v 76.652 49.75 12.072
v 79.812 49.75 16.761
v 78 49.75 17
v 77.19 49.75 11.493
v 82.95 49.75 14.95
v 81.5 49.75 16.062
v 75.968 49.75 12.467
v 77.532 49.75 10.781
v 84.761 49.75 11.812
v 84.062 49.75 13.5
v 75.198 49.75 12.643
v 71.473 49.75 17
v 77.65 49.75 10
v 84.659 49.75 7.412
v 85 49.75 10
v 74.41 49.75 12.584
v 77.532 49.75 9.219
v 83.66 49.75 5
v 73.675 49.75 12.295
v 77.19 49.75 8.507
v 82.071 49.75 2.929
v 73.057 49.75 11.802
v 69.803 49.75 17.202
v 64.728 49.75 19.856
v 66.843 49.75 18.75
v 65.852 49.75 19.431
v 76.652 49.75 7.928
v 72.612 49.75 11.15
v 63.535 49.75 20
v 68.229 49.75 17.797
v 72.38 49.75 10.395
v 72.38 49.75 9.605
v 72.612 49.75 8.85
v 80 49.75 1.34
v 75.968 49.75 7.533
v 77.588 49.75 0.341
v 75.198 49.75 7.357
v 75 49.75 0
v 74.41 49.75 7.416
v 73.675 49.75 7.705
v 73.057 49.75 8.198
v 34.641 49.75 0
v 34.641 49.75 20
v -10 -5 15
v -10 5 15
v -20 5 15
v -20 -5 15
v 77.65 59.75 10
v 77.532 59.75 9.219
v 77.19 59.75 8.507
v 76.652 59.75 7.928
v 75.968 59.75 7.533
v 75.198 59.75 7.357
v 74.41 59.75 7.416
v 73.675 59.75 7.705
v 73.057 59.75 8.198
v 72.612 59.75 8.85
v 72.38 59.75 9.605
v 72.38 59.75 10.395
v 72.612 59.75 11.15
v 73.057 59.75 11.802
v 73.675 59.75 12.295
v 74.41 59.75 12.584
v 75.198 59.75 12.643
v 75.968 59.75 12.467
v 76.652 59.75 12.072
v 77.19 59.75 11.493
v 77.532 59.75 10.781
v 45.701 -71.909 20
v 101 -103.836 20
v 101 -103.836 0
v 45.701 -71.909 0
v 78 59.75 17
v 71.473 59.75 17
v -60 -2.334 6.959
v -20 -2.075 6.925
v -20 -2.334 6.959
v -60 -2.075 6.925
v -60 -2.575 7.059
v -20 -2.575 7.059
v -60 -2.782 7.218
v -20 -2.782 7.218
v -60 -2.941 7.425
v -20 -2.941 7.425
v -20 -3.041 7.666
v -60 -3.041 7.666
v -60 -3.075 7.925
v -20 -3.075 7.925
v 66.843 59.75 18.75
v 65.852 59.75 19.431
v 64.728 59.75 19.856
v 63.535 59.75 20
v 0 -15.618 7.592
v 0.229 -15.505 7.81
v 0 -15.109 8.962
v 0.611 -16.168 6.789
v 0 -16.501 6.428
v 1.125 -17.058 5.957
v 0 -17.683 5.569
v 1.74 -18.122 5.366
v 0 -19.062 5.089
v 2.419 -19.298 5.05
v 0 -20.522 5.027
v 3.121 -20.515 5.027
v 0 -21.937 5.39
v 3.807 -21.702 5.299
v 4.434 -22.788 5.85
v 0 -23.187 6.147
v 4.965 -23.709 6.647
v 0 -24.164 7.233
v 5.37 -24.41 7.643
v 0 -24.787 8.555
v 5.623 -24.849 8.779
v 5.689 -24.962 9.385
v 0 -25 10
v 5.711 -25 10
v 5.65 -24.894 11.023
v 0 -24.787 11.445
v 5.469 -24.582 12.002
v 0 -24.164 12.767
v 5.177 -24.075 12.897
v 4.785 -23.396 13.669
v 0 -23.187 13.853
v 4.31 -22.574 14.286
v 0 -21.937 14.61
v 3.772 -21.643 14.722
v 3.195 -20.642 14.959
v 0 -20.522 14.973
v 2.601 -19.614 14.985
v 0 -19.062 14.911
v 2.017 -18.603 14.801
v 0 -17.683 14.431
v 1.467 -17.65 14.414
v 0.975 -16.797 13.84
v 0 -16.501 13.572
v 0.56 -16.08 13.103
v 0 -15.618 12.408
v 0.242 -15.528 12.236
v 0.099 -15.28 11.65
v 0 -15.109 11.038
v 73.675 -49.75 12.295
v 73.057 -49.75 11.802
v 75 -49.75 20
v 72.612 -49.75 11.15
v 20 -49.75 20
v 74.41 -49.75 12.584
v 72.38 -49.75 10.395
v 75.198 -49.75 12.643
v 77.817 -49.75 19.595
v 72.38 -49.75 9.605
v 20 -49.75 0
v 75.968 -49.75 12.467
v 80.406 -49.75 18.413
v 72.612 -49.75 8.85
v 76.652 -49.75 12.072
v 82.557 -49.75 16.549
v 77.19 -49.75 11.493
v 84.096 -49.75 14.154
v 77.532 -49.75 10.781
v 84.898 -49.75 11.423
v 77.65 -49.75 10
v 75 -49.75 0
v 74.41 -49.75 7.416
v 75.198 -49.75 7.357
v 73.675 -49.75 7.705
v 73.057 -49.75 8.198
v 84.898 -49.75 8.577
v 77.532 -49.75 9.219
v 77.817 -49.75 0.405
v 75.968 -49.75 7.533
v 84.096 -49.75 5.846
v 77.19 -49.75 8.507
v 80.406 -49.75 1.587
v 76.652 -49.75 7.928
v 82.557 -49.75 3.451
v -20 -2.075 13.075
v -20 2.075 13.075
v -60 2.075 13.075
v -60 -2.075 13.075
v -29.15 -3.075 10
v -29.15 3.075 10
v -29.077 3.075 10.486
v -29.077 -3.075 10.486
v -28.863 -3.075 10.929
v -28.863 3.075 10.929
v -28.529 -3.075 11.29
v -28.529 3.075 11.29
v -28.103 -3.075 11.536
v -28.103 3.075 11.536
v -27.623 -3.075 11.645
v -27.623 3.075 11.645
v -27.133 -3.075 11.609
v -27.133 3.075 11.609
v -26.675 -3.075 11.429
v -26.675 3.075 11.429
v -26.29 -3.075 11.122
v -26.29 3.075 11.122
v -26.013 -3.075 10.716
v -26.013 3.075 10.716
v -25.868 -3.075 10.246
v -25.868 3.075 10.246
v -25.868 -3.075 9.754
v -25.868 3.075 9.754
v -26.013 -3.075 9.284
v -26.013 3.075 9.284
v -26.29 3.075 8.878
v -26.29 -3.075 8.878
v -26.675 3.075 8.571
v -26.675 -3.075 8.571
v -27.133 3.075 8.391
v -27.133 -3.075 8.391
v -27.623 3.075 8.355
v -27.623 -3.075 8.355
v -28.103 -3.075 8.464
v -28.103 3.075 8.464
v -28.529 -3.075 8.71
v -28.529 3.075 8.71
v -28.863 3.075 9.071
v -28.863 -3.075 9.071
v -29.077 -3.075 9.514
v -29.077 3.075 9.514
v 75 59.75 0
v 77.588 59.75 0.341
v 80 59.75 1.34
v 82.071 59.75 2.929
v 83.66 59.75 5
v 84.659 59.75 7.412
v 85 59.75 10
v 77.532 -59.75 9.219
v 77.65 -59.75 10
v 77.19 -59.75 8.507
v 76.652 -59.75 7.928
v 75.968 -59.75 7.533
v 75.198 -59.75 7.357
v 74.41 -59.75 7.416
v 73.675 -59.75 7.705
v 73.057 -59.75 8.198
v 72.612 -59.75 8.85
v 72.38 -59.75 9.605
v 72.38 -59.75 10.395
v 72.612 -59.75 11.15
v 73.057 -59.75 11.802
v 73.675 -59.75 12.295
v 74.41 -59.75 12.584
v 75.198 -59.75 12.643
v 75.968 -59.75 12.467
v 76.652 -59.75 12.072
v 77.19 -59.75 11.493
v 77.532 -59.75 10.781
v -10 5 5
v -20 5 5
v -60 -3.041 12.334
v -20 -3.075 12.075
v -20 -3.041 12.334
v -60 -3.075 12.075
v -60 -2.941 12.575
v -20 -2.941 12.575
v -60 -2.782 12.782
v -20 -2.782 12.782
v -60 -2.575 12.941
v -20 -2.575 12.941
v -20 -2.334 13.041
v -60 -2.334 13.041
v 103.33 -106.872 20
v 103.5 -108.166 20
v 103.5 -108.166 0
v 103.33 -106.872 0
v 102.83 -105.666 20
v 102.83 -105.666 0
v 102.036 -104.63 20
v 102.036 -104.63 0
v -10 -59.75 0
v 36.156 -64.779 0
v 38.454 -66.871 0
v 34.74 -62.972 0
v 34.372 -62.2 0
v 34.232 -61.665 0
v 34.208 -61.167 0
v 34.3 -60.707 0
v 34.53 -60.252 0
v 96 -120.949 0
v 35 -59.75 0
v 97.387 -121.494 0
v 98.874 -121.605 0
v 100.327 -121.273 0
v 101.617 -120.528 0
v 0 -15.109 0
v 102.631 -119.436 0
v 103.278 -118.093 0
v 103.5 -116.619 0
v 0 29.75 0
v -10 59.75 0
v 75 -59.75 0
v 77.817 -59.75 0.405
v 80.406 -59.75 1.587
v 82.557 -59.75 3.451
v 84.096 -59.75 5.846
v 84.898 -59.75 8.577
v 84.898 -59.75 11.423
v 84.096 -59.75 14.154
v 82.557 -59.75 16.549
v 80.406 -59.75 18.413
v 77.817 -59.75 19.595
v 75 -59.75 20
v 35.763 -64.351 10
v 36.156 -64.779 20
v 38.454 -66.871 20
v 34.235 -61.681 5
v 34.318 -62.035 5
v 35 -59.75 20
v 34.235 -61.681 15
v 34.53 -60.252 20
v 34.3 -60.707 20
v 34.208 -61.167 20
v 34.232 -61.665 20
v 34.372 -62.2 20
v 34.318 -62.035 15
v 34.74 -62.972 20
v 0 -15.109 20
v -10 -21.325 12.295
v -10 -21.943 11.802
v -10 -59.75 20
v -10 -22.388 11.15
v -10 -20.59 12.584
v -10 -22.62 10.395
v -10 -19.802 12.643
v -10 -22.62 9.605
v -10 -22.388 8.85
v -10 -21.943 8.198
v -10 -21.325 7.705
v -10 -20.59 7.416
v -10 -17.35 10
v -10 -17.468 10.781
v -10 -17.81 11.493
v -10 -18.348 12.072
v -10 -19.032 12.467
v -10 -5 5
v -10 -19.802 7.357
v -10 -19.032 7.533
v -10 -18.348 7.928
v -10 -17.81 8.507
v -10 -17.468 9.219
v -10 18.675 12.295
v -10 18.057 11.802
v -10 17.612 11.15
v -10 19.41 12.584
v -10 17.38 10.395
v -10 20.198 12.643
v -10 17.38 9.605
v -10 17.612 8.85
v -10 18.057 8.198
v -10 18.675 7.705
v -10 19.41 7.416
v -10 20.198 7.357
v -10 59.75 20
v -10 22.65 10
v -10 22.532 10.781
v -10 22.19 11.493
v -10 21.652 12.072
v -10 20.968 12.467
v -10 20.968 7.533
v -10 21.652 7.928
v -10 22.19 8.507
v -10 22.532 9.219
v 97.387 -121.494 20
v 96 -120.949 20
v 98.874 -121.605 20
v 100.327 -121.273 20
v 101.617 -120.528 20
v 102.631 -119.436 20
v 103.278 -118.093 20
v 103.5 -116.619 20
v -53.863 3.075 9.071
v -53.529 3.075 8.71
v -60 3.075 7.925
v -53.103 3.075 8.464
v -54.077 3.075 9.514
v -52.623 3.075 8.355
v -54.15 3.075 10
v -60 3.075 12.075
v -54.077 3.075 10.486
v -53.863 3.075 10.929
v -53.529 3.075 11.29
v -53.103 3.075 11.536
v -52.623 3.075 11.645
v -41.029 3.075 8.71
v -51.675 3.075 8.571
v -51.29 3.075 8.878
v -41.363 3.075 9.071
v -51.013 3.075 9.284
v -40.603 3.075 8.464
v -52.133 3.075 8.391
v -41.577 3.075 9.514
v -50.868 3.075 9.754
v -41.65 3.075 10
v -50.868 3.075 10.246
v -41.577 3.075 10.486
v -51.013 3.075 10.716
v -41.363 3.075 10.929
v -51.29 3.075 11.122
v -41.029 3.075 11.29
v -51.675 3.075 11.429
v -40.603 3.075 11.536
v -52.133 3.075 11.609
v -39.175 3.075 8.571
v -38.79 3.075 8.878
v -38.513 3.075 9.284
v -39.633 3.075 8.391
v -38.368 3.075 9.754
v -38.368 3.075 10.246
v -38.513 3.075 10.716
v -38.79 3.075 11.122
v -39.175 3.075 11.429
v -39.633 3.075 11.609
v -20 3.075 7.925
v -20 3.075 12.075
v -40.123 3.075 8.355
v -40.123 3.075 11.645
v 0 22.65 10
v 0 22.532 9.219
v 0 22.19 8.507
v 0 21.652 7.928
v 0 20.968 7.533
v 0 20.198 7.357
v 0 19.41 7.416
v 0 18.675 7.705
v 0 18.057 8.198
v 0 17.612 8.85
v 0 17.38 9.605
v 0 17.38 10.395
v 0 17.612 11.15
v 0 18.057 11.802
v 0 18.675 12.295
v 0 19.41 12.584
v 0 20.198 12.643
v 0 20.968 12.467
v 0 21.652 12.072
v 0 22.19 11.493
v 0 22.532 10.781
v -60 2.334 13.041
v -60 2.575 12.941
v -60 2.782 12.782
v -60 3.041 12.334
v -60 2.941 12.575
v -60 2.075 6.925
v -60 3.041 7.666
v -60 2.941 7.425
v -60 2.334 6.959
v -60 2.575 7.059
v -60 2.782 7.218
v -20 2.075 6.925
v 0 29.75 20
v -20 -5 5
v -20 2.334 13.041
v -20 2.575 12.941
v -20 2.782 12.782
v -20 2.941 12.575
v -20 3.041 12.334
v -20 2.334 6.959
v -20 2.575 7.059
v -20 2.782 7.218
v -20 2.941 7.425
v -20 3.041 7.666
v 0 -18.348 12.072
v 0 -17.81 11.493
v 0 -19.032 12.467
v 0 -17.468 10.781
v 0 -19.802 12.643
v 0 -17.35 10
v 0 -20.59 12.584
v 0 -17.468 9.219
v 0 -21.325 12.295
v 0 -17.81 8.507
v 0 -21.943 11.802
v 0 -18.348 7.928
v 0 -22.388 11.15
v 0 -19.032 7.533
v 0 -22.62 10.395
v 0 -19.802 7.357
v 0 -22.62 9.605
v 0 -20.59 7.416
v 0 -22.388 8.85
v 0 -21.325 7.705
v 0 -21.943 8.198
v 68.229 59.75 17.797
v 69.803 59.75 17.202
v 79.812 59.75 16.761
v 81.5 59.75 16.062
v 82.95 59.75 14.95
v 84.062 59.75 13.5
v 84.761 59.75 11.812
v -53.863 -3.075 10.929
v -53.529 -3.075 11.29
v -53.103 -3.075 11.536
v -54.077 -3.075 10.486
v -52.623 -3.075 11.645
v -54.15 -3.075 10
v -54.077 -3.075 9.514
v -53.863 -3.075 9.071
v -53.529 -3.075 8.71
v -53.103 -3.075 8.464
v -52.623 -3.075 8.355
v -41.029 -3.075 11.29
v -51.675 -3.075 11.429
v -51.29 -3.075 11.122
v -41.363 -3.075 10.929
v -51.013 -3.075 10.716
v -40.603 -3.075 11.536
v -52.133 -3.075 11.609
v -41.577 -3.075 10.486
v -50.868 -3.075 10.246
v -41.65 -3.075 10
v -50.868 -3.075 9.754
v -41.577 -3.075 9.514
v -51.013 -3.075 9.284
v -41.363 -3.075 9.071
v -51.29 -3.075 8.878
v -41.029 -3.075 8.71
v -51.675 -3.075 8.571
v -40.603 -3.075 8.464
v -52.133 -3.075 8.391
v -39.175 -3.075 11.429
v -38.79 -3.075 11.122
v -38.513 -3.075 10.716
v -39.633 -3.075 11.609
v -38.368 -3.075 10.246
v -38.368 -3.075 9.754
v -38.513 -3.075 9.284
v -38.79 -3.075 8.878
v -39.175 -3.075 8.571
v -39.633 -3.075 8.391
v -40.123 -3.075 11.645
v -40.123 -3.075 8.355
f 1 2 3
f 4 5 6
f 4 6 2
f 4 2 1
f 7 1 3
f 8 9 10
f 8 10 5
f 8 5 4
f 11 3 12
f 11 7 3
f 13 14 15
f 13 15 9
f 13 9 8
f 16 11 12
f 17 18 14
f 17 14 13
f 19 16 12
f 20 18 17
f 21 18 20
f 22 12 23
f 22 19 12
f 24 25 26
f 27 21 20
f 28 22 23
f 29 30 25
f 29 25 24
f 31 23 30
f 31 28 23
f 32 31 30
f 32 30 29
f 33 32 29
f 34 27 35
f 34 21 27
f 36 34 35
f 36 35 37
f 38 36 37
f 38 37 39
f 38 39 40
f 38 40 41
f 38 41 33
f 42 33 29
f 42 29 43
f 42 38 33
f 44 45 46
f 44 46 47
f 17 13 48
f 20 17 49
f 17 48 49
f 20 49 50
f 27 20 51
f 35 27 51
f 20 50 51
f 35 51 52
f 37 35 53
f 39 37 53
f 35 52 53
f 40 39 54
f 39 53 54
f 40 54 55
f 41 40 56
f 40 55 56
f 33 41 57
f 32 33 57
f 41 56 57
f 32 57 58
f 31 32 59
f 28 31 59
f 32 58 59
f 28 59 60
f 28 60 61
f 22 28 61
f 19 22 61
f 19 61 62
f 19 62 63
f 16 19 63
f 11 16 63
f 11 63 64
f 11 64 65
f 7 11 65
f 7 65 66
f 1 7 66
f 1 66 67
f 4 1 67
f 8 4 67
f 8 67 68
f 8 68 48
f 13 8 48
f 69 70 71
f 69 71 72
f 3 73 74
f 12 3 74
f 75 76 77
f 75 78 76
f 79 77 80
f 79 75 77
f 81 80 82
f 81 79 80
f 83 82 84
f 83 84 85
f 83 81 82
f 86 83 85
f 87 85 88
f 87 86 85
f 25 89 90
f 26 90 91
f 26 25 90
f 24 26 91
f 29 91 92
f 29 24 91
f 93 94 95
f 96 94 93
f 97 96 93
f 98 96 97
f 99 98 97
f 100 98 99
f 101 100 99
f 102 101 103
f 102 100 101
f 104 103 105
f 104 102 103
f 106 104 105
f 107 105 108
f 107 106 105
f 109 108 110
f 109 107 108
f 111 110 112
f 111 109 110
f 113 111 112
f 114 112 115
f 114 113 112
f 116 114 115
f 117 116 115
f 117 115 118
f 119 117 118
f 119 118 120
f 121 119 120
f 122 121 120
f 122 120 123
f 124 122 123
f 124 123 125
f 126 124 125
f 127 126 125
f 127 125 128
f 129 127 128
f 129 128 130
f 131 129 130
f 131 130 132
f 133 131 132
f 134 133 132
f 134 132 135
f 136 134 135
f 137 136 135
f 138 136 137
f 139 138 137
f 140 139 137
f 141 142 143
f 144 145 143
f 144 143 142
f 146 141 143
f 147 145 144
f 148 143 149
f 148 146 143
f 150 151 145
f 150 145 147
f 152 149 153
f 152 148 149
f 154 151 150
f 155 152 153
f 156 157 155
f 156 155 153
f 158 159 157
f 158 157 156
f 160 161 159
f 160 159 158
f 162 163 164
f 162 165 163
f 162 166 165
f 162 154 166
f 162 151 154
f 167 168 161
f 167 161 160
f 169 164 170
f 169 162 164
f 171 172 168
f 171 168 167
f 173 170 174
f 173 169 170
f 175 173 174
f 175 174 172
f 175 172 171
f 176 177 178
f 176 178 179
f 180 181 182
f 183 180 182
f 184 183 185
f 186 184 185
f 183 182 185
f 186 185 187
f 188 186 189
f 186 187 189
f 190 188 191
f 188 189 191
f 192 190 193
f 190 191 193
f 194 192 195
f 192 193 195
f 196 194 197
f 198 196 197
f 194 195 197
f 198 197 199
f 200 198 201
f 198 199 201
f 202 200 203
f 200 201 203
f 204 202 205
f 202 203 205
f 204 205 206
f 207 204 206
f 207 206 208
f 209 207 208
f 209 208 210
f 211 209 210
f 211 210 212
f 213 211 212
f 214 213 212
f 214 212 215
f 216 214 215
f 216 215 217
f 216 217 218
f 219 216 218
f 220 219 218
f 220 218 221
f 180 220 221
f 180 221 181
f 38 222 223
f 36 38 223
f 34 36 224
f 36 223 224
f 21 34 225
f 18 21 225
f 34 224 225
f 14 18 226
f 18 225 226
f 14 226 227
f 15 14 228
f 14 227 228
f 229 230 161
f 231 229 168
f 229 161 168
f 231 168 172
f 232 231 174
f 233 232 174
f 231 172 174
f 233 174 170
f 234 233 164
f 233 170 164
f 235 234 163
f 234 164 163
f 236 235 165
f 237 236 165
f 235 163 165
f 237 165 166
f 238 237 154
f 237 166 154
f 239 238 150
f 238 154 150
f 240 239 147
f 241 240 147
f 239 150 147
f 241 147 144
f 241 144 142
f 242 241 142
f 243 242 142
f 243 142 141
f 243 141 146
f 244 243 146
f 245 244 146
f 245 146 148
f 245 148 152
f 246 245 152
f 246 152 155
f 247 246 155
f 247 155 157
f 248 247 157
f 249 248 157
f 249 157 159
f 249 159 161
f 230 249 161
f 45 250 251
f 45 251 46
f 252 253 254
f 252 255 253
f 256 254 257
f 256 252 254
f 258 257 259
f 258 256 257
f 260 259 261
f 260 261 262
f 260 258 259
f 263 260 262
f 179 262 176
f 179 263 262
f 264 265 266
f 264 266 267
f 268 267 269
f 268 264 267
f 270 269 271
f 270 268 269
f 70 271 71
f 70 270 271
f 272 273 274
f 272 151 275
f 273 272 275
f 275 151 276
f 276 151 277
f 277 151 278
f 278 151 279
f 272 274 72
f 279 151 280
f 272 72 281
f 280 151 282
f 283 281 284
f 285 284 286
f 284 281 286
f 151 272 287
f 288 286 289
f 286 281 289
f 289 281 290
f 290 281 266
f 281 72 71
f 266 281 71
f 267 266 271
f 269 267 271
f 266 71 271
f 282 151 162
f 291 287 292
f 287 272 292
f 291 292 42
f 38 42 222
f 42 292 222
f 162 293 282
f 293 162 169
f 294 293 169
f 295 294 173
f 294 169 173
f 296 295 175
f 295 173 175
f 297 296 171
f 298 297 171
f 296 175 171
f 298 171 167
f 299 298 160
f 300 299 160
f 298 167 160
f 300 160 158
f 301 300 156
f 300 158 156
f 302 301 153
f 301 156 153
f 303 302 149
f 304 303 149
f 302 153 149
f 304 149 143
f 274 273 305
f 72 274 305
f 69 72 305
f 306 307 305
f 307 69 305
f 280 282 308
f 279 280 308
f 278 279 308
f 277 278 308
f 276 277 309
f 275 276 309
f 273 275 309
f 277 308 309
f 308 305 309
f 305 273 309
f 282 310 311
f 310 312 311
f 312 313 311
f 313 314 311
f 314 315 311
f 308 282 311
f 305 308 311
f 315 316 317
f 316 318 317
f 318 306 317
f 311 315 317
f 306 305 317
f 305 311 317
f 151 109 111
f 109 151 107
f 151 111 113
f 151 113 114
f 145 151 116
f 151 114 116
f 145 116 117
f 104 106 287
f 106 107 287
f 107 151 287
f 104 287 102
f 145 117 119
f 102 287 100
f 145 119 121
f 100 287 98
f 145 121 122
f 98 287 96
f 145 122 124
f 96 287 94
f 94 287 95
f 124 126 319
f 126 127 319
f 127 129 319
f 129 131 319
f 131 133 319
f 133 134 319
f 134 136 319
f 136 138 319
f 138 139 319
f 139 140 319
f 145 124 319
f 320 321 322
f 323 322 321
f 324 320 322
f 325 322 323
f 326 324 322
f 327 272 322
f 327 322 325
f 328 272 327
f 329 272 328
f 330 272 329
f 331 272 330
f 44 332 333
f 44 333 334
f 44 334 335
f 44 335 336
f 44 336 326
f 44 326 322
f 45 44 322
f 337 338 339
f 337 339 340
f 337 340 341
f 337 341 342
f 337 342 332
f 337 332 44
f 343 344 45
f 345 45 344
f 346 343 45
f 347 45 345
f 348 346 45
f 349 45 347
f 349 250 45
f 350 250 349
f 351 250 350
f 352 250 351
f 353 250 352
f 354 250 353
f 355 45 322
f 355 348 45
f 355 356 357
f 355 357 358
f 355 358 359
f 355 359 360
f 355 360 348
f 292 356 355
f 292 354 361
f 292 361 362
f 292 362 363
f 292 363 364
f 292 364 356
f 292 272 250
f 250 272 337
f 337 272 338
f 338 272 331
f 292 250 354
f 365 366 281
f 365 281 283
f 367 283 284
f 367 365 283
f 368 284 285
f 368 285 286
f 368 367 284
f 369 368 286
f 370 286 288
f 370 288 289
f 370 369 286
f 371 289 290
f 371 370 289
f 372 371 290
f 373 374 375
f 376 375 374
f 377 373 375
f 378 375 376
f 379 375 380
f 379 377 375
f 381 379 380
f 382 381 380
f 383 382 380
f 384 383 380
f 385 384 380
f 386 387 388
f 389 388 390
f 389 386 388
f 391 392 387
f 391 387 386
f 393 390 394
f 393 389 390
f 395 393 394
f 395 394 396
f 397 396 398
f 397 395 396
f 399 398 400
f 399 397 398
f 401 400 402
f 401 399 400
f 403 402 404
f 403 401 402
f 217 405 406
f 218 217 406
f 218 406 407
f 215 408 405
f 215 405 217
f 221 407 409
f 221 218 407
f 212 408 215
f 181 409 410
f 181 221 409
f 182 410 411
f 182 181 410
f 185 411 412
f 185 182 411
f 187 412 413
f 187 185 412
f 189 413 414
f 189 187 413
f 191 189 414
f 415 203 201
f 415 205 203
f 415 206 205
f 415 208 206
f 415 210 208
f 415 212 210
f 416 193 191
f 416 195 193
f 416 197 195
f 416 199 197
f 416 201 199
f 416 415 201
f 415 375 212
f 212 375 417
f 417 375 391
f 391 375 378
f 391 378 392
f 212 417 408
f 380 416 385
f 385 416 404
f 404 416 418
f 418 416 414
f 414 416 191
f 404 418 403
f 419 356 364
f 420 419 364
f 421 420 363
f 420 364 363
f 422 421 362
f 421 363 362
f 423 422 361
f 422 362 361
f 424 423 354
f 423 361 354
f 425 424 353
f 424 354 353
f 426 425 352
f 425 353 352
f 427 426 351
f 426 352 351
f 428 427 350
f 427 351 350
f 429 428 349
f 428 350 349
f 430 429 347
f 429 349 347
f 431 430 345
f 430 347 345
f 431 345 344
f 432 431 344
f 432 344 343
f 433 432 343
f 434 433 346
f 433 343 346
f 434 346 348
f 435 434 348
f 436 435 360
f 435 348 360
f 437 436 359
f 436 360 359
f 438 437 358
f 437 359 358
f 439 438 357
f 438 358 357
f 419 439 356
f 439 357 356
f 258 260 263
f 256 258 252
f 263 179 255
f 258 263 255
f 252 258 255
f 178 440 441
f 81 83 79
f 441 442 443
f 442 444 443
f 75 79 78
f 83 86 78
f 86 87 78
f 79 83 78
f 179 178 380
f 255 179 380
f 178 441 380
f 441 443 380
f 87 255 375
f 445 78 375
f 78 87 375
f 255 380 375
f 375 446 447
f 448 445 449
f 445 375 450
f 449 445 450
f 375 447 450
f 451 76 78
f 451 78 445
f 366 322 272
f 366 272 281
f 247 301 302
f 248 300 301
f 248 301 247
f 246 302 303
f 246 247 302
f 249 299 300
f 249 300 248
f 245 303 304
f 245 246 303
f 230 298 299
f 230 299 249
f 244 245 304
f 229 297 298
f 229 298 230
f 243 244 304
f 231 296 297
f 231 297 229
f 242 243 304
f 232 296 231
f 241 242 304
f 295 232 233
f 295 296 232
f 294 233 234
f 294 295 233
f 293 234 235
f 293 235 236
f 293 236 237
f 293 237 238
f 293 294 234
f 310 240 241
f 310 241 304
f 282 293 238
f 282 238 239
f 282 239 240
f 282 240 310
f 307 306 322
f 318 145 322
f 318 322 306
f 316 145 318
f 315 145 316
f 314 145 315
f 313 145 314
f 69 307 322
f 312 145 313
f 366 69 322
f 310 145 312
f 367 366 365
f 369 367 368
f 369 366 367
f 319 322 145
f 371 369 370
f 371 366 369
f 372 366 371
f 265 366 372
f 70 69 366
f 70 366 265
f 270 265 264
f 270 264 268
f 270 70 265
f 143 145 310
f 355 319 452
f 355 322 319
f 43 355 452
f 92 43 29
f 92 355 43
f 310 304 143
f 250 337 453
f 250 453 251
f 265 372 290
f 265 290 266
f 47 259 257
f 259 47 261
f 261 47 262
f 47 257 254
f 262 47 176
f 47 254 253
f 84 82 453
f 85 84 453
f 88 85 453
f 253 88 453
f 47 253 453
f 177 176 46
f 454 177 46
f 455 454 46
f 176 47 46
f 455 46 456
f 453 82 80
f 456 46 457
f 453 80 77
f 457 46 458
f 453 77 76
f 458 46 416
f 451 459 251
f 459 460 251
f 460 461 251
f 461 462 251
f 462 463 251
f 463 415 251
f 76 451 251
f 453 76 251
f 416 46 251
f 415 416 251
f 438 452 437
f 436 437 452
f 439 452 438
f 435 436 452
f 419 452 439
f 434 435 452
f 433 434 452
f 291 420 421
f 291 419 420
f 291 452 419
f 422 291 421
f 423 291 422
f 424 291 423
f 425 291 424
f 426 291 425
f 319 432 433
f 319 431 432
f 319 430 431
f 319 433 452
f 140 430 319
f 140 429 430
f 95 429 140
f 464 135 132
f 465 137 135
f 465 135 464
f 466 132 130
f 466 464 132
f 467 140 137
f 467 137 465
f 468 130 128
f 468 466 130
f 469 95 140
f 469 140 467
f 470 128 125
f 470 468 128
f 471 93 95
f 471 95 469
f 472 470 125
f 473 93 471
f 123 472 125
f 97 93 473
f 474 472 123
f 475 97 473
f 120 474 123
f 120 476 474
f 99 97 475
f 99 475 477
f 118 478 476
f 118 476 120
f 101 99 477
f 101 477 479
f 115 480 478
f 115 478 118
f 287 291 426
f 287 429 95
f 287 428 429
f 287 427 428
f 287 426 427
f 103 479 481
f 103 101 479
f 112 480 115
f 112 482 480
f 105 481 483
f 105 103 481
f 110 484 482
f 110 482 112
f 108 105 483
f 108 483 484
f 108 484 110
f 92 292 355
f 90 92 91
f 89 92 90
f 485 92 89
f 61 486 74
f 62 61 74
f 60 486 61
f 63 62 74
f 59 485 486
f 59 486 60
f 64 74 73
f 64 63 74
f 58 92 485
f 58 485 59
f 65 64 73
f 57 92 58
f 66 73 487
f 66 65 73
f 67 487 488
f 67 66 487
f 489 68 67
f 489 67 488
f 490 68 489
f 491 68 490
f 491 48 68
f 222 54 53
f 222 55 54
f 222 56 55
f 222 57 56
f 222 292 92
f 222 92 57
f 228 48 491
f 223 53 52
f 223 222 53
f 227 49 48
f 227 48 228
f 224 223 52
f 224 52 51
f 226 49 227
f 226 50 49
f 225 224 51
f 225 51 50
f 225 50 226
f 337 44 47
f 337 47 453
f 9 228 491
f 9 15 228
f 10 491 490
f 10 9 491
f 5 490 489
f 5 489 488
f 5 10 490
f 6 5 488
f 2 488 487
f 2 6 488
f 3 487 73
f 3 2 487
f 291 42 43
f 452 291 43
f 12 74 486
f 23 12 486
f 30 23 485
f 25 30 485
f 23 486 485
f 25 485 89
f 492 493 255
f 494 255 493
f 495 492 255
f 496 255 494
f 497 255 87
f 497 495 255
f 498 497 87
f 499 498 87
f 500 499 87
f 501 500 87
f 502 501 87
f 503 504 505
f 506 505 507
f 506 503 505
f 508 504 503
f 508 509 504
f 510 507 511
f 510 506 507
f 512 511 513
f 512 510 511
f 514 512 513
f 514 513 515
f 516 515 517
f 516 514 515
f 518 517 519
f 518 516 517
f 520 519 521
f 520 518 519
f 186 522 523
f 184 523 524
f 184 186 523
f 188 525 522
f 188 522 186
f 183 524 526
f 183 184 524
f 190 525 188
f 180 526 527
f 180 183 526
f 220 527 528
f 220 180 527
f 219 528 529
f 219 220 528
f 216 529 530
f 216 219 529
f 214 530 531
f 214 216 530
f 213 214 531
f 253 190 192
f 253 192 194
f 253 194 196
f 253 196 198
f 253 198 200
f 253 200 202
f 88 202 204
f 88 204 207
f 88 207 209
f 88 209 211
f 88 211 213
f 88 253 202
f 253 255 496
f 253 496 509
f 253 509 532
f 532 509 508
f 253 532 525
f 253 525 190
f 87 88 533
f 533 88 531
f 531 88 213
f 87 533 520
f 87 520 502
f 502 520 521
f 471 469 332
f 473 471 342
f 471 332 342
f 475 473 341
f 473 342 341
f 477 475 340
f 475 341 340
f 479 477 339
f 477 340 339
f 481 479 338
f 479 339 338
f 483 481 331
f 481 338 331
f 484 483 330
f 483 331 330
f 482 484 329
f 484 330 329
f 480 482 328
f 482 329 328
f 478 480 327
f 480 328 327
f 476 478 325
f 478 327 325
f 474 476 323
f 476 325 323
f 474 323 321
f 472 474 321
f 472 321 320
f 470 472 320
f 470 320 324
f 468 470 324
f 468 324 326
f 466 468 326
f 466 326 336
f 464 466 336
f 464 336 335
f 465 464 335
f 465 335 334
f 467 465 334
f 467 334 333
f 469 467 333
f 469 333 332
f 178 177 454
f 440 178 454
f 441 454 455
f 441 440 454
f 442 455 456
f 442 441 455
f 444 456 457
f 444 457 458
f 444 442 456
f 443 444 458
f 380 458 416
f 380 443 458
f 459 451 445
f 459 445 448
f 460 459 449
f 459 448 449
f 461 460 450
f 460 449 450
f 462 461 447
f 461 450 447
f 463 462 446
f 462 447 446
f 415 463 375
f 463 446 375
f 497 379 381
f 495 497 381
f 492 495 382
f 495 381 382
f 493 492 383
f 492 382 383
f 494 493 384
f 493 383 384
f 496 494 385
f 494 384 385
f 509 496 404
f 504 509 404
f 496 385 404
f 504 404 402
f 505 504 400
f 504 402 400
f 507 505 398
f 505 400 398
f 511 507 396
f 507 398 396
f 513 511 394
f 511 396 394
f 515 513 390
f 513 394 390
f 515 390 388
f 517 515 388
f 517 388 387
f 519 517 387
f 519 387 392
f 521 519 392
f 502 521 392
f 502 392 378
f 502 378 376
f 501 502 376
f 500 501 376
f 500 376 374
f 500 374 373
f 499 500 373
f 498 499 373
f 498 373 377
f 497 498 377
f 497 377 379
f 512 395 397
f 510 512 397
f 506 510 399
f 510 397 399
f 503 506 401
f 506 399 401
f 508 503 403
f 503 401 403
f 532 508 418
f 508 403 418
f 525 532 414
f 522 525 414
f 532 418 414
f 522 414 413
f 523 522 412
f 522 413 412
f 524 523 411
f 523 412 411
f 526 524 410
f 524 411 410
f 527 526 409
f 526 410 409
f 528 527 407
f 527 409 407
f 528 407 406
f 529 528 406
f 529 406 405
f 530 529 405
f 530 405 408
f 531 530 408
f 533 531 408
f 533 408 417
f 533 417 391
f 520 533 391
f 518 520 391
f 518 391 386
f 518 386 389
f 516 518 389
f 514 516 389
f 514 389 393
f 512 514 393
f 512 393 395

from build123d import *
from OCP.BRepFilletAPI import BRepFilletAPI_MakeChamfer, BRepFilletAPI_MakeFillet

# Parameters (mm, degrees)
EXTRUDE_1_DEPTH     = 20
EXTRUDE_2_DEPTH     = 10
EXTRUDE_START       = 10
EXTRUDE_3_DEPTH     = 40
CUT_EXTRUDE_1_DEPTH = 149.00422291272636
FILLET_1_R          = 1
SKETCH_7_R          = 1.6500000000000021
SKETCH_7_R_2        = 1.6499999999999988
CUT_EXTRUDE_2_DEPTH = 108.57314081591156
CHAMFER_1_SIZE      = 20.000000000000007
CHAMFER_1_SIZE2     = 34.64101615137772
CUT_EXTRUDE_3_REACH = 150.004
FILLET_2_R1         = 5
FILLET_2_R2         = 7
CUT_EXTRUDE_4_REACH = 115.996
CUT_EXTRUDE_START   = -15.710581
CUT_EXTRUDE_5_DEPTH = 5.7105809999999995
BOSS_EXTRUDE1_DEPTH = 20.000000000000004


with BuildPart() as part:
    # 草图1 → 凸台-拉伸1 (new body)
    with BuildSketch(Plane.XY):
        Polygon((-1.953e-14, 49.75), (1.093e-14, -49.75), (85.00000000000001, -49.74999999999995), (85.00000000000001, -59.74999999999995), (-9.999999999999986, -59.74999999999995), (-9.999999999999995, 59.749999999999986), (85, 59.75000000000001), (84.99999999999999, 49.75), align=None)
    extrude(amount=EXTRUDE_1_DEPTH)

    # 草图3 → 凸台-拉伸2 (add)
    # profile 1 of 2: a face of its own
    with BuildSketch(Plane.ZY.offset(9.99999999999999)):
        Polygon((15, 5.000000000000008), (15, -4.999999999999993), (5.000000000000002, -4.999999999999993), (5, 5.000000000000007), align=None)
        Polygon((6.925000000000001, 3.075000000000007), (6.925000000000002, -3.074999999999993), (13.075, -3.074999999999993), (13.075, 3.075000000000007), align=None, mode=Mode.SUBTRACT)
    # profile 2 of 2: a face of its own
    with BuildSketch(Plane.ZY.offset(9.99999999999999)):
        Polygon((6.925000000000001, 3.075000000000007), (13.075, 3.075000000000007), (13.075, -3.074999999999993), (6.925000000000002, -3.074999999999993), align=None)
    extrude(amount=EXTRUDE_2_DEPTH)

    # 草图3<3> → 凸台-拉伸3 (add)
    with BuildSketch(Plane.ZY.offset(9.99999999999999).offset(EXTRUDE_START)):
        Polygon((6.925000000000001, 3.075000000000007), (13.075, 3.075000000000007), (13.075, -3.074999999999993), (6.925000000000002, -3.074999999999993), align=None)
    extrude(amount=EXTRUDE_3_DEPTH)

    # 草图5 → 切除-拉伸1 (cut, through all)
    with BuildSketch(Plane(origin=(-1.309e-14, 59.749999999999986, 0), x_dir=(1, 2.3e-16, 0), z_dir=(-2.3e-16, 1, 0))):
        with BuildLine():
            ThreePointArc((72.34999999999964, -10), (74.99999999999964, -12.65), (77.64999999999965, -10))
            Line((77.64999999999965, -9.99999999999999), (72.34999999999964, -9.999999999999991))
        make_face()
        with BuildLine():
            Line((72.34999999999964, -9.999999999999991), (77.64999999999965, -9.99999999999999))
            ThreePointArc((77.64999999999965, -10), (74.99999999999964, -7.35), (72.34999999999964, -9.999999999999998))
        make_face()
        with BuildLine():
            Line((85.00000000000001, -20), (85.00000000000001, -9.999999999999995))
            ThreePointArc((84.99999999999964, -10.000000000000002), (82.07106781186489, -17.071067811865692), (74.99999999999903, -19.999999999999993))
            Line((74.99999999999903, -20), (85.00000000000001, -20))
        make_face()
        with BuildLine():
            ThreePointArc((74.99999999999908, -5.33e-15), (82.07106781186492, -2.928932188134328), (84.99999999999964, -10))
            Line((85.00000000000001, -9.999999999999995), (85.00000000000001, 0))
            Line((85.00000000000001, 0), (74.99999999999908, 0))
        make_face()
    extrude(amount=-CUT_EXTRUDE_1_DEPTH, mode=Mode.SUBTRACT)

    # 圆角1
    fillet_1_edges = [part.edges().sort_by_distance(p)[0] for p in [
        (-39.999999999999986, -3.0749999999999953, 6.925000000000002),
        (-39.999999999999986, -3.0749999999999953, 13.075),
        (-39.999999999999986, 3.0750000000000046, 13.075),
        (-39.999999999999986, 3.0750000000000046, 6.925000000000001),
    ]]
    fillet(fillet_1_edges, radius=FILLET_1_R)

    # 草图7 → 切除-拉伸2 (cut, through all)
    with BuildSketch(Plane(origin=(-1.6e-16, 3.0750000000000064, 0), x_dir=(1, 5e-17, 0), z_dir=(-5e-17, 1, 0))):
        with Locations(Location((-39.99999999999999, -10, 0), (0, 0, 180))):
            Circle(SKETCH_7_R)
        with Locations(Location((-52.49999999999999, -10.000000000000002, 0), (0, 0, 180))):
            Circle(SKETCH_7_R)
        with Locations(Location((-27.499999999999993, -9.999999999999998, 0), (0, 0, 180))):
            Circle(SKETCH_7_R_2)
    extrude(amount=-CUT_EXTRUDE_2_DEPTH, mode=Mode.SUBTRACT)

    # 倒角1: one chamfer whose edges measure the first distance from different faces: ONE call of the kernel's chamfer builder (chamfer() names one face for all edges)
    chamfer_1_edges_1 = [part.edges().sort_by_distance(p)[0] for p in [
        (-1.953e-14, 49.75, 10),
    ]]
    chamfer_1_side_1 = [part.faces().sort_by_distance(p)[0] for p in [
        (-4.3e-15, -1.94e-15, 10),
    ]]
    chamfer_1_edges_2 = [part.edges().sort_by_distance(p)[0] for p in [
        (1.093e-14, -49.75, 10),
    ]]
    chamfer_1_side_2 = [part.faces().sort_by_distance(p)[0] for p in [
        (41.004447540474715, -49.74999999999998, 9.99999999999999),
    ]]
    chamfer_1 = BRepFilletAPI_MakeChamfer(part.part.solid().wrapped)
    for e in chamfer_1_edges_1:
        chamfer_1.Add(CHAMFER_1_SIZE, CHAMFER_1_SIZE2, e.wrapped, chamfer_1_side_1[0].wrapped)  # the first distance lies on this face
    for e in chamfer_1_edges_2:
        chamfer_1.Add(CHAMFER_1_SIZE, CHAMFER_1_SIZE2, e.wrapped, chamfer_1_side_2[0].wrapped)  # the first distance lies on this face
    add(Compound.cast(chamfer_1.Shape()), mode=Mode.REPLACE)

    # 草图8 → 切除-拉伸3 (cut, up to next)
    with BuildSketch(Plane(origin=(-1.309e-14, 59.749999999999986, 0), x_dir=(1, 2.2e-16, 0), z_dir=(-2.2e-16, 1, 0)), mode=Mode.PRIVATE) as cut_extrude_3_sk1:
        with BuildLine():
            ThreePointArc((74.99999999999964, -20), (78.87298334620706, -19.219544457292884), (82.14142842854251, -16.99999999999999))
            Line((82.14142842854251, -16.999999999999993), (71.47264625833486, -16.999999999999993))
            ThreePointArc((71.47264625833486, -16.999999999999993), (68.23227590913093, -17.795163177004564), (65.72808361179683, -20.000000000000007))
            Line((65.72808361179683, -20), (74.99999999999964, -20))
        make_face()
    cut_extrude_3_tool1 = extrude(cut_extrude_3_sk1.sketch, amount=-CUT_EXTRUDE_3_REACH, mode=Mode.PRIVATE) & part.part
    add(cut_extrude_3_tool1.solids().sort_by_distance((73.723085, 59.75, 18.477053))[0], mode=Mode.SUBTRACT)

    # 圆角2: one fillet with a radius per group of edges: ONE call of the kernel's fillet builder (fillet() takes one radius for all edges)
    fillet_2_edges_1 = [part.edges().sort_by_distance(p)[0] for p in [
        (65.72808361179682, 54.75, 20.000000000000004),
    ]]
    fillet_2_edges_2 = [part.edges().sort_by_distance(p)[0] for p in [
        (82.1414284285425, 54.75, 16.999999999999993),
    ]]
    fillet_2 = BRepFilletAPI_MakeFillet(part.part.solid().wrapped)
    for e in fillet_2_edges_1:
        fillet_2.Add(FILLET_2_R1, e.wrapped)
    for e in fillet_2_edges_2:
        fillet_2.Add(FILLET_2_R2, e.wrapped)
    add(Compound.cast(fillet_2.Shape()), mode=Mode.REPLACE)

    # 草图10 → 切除-拉伸4 (cut, up to next)
    with BuildSketch(Plane.ZY.offset(9.99999999999999), mode=Mode.PRIVATE) as cut_extrude_4_sk1:
        with BuildLine():
            ThreePointArc((12.649999999999984, 20.00000000000003), (11.873832970144308, 21.873832970144406), (9.999999999999908, 22.650000000000027))
            Line((9.999999999999988, 22.650000000000027), (9.999999999999988, 20.00000000000003))
            Line((9.999999999999988, 20.00000000000003), (9.99999999999999, 17.35000000000003))
            ThreePointArc((9.999999999999908, 17.35000000000003), (11.873832970144308, 18.12616702985565), (12.649999999999984, 20.00000000000003))
        make_face()
    cut_extrude_4_tool1 = extrude(cut_extrude_4_sk1.sketch, amount=-CUT_EXTRUDE_4_REACH, mode=Mode.PRIVATE) & part.part
    # 草图10 → 切除-拉伸4 (cut, up to next)
    with BuildSketch(Plane.ZY.offset(9.99999999999999), mode=Mode.PRIVATE) as cut_extrude_4_sk2:
        with BuildLine():
            Line((9.999999999999988, 20.00000000000003), (9.999999999999988, 22.650000000000027))
            ThreePointArc((9.999999999999908, 22.650000000000027), (7.349999999999984, 20.00000000000003), (9.999999999999908, 17.35000000000003))
            Line((9.99999999999999, 17.35000000000003), (9.999999999999988, 20.00000000000003))
        make_face()
    cut_extrude_4_tool2 = extrude(cut_extrude_4_sk2.sketch, amount=-CUT_EXTRUDE_4_REACH, mode=Mode.PRIVATE) & part.part
    # 草图10 → 切除-拉伸4 (cut, up to next)
    with BuildSketch(Plane.ZY.offset(9.99999999999999), mode=Mode.PRIVATE) as cut_extrude_4_sk3:
        with BuildLine():
            ThreePointArc((12.649999999999984, 20.00000000000003), (11.873832970144308, 21.873832970144406), (9.999999999999908, 22.650000000000027))
            Line((9.999999999999988, 22.650000000000027), (9.999999999999988, 20.00000000000003))
            Line((9.999999999999988, 20.00000000000003), (9.99999999999999, 17.35000000000003))
            ThreePointArc((9.999999999999908, 17.35000000000003), (11.873832970144308, 18.12616702985565), (12.649999999999984, 20.00000000000003))
        make_face()
    cut_extrude_4_tool3 = extrude(cut_extrude_4_sk3.sketch, amount=-CUT_EXTRUDE_4_REACH, mode=Mode.PRIVATE) & part.part
    # 草图10 → 切除-拉伸4 (cut, up to next)
    with BuildSketch(Plane.ZY.offset(9.99999999999999), mode=Mode.PRIVATE) as cut_extrude_4_sk4:
        with BuildLine():
            Line((9.999999999999988, 20.00000000000003), (9.999999999999988, 22.650000000000027))
            ThreePointArc((9.999999999999908, 22.650000000000027), (7.349999999999984, 20.00000000000003), (9.999999999999908, 17.35000000000003))
            Line((9.99999999999999, 17.35000000000003), (9.999999999999988, 20.00000000000003))
        make_face()
    cut_extrude_4_tool4 = extrude(cut_extrude_4_sk4.sketch, amount=-CUT_EXTRUDE_4_REACH, mode=Mode.PRIVATE) & part.part
    # 草图10 → 切除-拉伸4 (cut, up to next)
    with BuildSketch(Plane.ZY.offset(9.99999999999999), mode=Mode.PRIVATE) as cut_extrude_4_sk5:
        with BuildLine():
            ThreePointArc((12.649999999999997, -19.99999999999997), (11.873832970144319, -18.12616702985559), (9.999999999999915, -17.349999999999973))
            Line((9.999999999999993, -17.349999999999966), (9.999999999999995, -19.99999999999997))
            Line((9.999999999999995, -19.99999999999997), (9.999999999999995, -22.649999999999977))
            ThreePointArc((9.999999999999917, -22.64999999999997), (11.873832970144319, -21.873832970144353), (12.649999999999997, -19.99999999999997))
        make_face()
    cut_extrude_4_tool5 = extrude(cut_extrude_4_sk5.sketch, amount=-CUT_EXTRUDE_4_REACH, mode=Mode.PRIVATE) & part.part
    # 草图10 → 切除-拉伸4 (cut, up to next)
    with BuildSketch(Plane.ZY.offset(9.99999999999999), mode=Mode.PRIVATE) as cut_extrude_4_sk6:
        with BuildLine():
            Line((9.999999999999995, -19.99999999999997), (9.999999999999993, -17.349999999999966))
            ThreePointArc((9.999999999999915, -17.349999999999973), (7.349999999999996, -19.99999999999997), (9.999999999999917, -22.64999999999997))
            Line((9.999999999999995, -22.649999999999977), (9.999999999999995, -19.99999999999997))
        make_face()
    cut_extrude_4_tool6 = extrude(cut_extrude_4_sk6.sketch, amount=-CUT_EXTRUDE_4_REACH, mode=Mode.PRIVATE) & part.part
    # 草图10 → 切除-拉伸4 (cut, up to next)
    with BuildSketch(Plane.ZY.offset(9.99999999999999), mode=Mode.PRIVATE) as cut_extrude_4_sk7:
        with BuildLine():
            ThreePointArc((12.649999999999997, -19.99999999999997), (11.873832970144319, -18.12616702985559), (9.999999999999915, -17.349999999999973))
            Line((9.999999999999993, -17.349999999999966), (9.999999999999995, -19.99999999999997))
            Line((9.999999999999995, -19.99999999999997), (9.999999999999995, -22.649999999999977))
            ThreePointArc((9.999999999999917, -22.64999999999997), (11.873832970144319, -21.873832970144353), (12.649999999999997, -19.99999999999997))
        make_face()
    cut_extrude_4_tool7 = extrude(cut_extrude_4_sk7.sketch, amount=-CUT_EXTRUDE_4_REACH, mode=Mode.PRIVATE) & part.part
    # 草图10 → 切除-拉伸4 (cut, up to next)
    with BuildSketch(Plane.ZY.offset(9.99999999999999), mode=Mode.PRIVATE) as cut_extrude_4_sk8:
        with BuildLine():
            Line((9.999999999999995, -19.99999999999997), (9.999999999999993, -17.349999999999966))
            ThreePointArc((9.999999999999915, -17.349999999999973), (7.349999999999996, -19.99999999999997), (9.999999999999917, -22.64999999999997))
            Line((9.999999999999995, -22.649999999999977), (9.999999999999995, -19.99999999999997))
        make_face()
    cut_extrude_4_tool8 = extrude(cut_extrude_4_sk8.sketch, amount=-CUT_EXTRUDE_4_REACH, mode=Mode.PRIVATE) & part.part
    add(cut_extrude_4_tool1.solids().sort_by_distance((-10, 20, 11.124695))[0], mode=Mode.SUBTRACT)
    add(cut_extrude_4_tool2.solids().sort_by_distance((-10, 20, 8.875305))[0], mode=Mode.SUBTRACT)
    add(cut_extrude_4_tool3.solids().sort_by_distance((-10, 20, 11.124695))[0], mode=Mode.SUBTRACT)
    add(cut_extrude_4_tool4.solids().sort_by_distance((-10, 20, 8.875305))[0], mode=Mode.SUBTRACT)
    add(cut_extrude_4_tool5.solids().sort_by_distance((-10, -20, 11.124695))[0], mode=Mode.SUBTRACT)
    add(cut_extrude_4_tool6.solids().sort_by_distance((-10, -20, 8.875305))[0], mode=Mode.SUBTRACT)
    add(cut_extrude_4_tool7.solids().sort_by_distance((-10, -20, 11.124695))[0], mode=Mode.SUBTRACT)
    add(cut_extrude_4_tool8.solids().sort_by_distance((-10, -20, 8.875305))[0], mode=Mode.SUBTRACT)

    # 草图10<3> → 切除-拉伸5 (cut)
    with BuildSketch(Plane.ZY.offset(9.99999999999999).offset(CUT_EXTRUDE_START)):
        with BuildLine():
            ThreePointArc((14.999999999999996, -19.99999999999997), (13.535533905932759, -16.46446609406726), (10.000000000000064, -14.999999999999972))
            Line((9.999999999999993, -14.999999999999972), (9.999999999999993, -17.349999999999966))
            ThreePointArc((9.999999999999915, -17.349999999999973), (11.873832970144319, -18.12616702985559), (12.649999999999997, -19.99999999999997))
            ThreePointArc((12.649999999999997, -19.99999999999997), (11.873832970144319, -21.873832970144353), (9.999999999999917, -22.64999999999997))
            Line((9.999999999999995, -22.649999999999977), (9.999999999999995, -24.99999999999997))
            ThreePointArc((10.000000000000057, -24.99999999999997), (13.535533905932756, -23.535533905932688), (14.999999999999996, -19.99999999999997))
        make_face()
        with BuildLine():
            Line((9.999999999999993, -17.349999999999966), (9.999999999999993, -14.999999999999972))
            ThreePointArc((10.000000000000064, -14.999999999999972), (4.999999999999996, -19.999999999999968), (10.000000000000057, -24.99999999999997))
            Line((9.999999999999995, -24.99999999999997), (9.999999999999995, -22.649999999999977))
            ThreePointArc((9.999999999999917, -22.64999999999997), (7.349999999999996, -19.99999999999997), (9.999999999999915, -17.349999999999973))
        make_face()
    extrude(amount=CUT_EXTRUDE_5_DEPTH, mode=Mode.SUBTRACT)

    # Sketch1 → Boss-Extrude1 (add)
    with BuildSketch(Plane.XY.offset(20)):
        with BuildLine():
            Line((-9.999999999999986, -59.74999999999996), (96, -120.94912853410044))
            ThreePointArc((96, -120.94912853410044), (101.00000000000001, -120.94912853410044), (103.50000000000001, -116.61900151517824))
            Line((103.50000000000001, -116.61900151517824), (103.50000000000001, -108.16600689897072))
            ThreePointArc((103.50000000000001, -108.16600689897072), (102.8301270189222, -105.6660068989707), (101, -103.83587988004852))
            Line((101, -103.83587988004852), (45.700950959074255, -71.90895903033973))
            add(Edge.make_bspline(
                [(35.00000000000001, -59.74999999999995), (31.175910828961968, -62.87321170356669), (45.700950959074255, -71.90895903033973)],
                knots=[0, 0, 0, 1, 1, 1], degree=2))
            Line((35.00000000000001, -59.74999999999995), (-9.999999999999986, -59.74999999999996))
        make_face()
    extrude(amount=-BOSS_EXTRUDE1_DEPTH)


solid = part.part
